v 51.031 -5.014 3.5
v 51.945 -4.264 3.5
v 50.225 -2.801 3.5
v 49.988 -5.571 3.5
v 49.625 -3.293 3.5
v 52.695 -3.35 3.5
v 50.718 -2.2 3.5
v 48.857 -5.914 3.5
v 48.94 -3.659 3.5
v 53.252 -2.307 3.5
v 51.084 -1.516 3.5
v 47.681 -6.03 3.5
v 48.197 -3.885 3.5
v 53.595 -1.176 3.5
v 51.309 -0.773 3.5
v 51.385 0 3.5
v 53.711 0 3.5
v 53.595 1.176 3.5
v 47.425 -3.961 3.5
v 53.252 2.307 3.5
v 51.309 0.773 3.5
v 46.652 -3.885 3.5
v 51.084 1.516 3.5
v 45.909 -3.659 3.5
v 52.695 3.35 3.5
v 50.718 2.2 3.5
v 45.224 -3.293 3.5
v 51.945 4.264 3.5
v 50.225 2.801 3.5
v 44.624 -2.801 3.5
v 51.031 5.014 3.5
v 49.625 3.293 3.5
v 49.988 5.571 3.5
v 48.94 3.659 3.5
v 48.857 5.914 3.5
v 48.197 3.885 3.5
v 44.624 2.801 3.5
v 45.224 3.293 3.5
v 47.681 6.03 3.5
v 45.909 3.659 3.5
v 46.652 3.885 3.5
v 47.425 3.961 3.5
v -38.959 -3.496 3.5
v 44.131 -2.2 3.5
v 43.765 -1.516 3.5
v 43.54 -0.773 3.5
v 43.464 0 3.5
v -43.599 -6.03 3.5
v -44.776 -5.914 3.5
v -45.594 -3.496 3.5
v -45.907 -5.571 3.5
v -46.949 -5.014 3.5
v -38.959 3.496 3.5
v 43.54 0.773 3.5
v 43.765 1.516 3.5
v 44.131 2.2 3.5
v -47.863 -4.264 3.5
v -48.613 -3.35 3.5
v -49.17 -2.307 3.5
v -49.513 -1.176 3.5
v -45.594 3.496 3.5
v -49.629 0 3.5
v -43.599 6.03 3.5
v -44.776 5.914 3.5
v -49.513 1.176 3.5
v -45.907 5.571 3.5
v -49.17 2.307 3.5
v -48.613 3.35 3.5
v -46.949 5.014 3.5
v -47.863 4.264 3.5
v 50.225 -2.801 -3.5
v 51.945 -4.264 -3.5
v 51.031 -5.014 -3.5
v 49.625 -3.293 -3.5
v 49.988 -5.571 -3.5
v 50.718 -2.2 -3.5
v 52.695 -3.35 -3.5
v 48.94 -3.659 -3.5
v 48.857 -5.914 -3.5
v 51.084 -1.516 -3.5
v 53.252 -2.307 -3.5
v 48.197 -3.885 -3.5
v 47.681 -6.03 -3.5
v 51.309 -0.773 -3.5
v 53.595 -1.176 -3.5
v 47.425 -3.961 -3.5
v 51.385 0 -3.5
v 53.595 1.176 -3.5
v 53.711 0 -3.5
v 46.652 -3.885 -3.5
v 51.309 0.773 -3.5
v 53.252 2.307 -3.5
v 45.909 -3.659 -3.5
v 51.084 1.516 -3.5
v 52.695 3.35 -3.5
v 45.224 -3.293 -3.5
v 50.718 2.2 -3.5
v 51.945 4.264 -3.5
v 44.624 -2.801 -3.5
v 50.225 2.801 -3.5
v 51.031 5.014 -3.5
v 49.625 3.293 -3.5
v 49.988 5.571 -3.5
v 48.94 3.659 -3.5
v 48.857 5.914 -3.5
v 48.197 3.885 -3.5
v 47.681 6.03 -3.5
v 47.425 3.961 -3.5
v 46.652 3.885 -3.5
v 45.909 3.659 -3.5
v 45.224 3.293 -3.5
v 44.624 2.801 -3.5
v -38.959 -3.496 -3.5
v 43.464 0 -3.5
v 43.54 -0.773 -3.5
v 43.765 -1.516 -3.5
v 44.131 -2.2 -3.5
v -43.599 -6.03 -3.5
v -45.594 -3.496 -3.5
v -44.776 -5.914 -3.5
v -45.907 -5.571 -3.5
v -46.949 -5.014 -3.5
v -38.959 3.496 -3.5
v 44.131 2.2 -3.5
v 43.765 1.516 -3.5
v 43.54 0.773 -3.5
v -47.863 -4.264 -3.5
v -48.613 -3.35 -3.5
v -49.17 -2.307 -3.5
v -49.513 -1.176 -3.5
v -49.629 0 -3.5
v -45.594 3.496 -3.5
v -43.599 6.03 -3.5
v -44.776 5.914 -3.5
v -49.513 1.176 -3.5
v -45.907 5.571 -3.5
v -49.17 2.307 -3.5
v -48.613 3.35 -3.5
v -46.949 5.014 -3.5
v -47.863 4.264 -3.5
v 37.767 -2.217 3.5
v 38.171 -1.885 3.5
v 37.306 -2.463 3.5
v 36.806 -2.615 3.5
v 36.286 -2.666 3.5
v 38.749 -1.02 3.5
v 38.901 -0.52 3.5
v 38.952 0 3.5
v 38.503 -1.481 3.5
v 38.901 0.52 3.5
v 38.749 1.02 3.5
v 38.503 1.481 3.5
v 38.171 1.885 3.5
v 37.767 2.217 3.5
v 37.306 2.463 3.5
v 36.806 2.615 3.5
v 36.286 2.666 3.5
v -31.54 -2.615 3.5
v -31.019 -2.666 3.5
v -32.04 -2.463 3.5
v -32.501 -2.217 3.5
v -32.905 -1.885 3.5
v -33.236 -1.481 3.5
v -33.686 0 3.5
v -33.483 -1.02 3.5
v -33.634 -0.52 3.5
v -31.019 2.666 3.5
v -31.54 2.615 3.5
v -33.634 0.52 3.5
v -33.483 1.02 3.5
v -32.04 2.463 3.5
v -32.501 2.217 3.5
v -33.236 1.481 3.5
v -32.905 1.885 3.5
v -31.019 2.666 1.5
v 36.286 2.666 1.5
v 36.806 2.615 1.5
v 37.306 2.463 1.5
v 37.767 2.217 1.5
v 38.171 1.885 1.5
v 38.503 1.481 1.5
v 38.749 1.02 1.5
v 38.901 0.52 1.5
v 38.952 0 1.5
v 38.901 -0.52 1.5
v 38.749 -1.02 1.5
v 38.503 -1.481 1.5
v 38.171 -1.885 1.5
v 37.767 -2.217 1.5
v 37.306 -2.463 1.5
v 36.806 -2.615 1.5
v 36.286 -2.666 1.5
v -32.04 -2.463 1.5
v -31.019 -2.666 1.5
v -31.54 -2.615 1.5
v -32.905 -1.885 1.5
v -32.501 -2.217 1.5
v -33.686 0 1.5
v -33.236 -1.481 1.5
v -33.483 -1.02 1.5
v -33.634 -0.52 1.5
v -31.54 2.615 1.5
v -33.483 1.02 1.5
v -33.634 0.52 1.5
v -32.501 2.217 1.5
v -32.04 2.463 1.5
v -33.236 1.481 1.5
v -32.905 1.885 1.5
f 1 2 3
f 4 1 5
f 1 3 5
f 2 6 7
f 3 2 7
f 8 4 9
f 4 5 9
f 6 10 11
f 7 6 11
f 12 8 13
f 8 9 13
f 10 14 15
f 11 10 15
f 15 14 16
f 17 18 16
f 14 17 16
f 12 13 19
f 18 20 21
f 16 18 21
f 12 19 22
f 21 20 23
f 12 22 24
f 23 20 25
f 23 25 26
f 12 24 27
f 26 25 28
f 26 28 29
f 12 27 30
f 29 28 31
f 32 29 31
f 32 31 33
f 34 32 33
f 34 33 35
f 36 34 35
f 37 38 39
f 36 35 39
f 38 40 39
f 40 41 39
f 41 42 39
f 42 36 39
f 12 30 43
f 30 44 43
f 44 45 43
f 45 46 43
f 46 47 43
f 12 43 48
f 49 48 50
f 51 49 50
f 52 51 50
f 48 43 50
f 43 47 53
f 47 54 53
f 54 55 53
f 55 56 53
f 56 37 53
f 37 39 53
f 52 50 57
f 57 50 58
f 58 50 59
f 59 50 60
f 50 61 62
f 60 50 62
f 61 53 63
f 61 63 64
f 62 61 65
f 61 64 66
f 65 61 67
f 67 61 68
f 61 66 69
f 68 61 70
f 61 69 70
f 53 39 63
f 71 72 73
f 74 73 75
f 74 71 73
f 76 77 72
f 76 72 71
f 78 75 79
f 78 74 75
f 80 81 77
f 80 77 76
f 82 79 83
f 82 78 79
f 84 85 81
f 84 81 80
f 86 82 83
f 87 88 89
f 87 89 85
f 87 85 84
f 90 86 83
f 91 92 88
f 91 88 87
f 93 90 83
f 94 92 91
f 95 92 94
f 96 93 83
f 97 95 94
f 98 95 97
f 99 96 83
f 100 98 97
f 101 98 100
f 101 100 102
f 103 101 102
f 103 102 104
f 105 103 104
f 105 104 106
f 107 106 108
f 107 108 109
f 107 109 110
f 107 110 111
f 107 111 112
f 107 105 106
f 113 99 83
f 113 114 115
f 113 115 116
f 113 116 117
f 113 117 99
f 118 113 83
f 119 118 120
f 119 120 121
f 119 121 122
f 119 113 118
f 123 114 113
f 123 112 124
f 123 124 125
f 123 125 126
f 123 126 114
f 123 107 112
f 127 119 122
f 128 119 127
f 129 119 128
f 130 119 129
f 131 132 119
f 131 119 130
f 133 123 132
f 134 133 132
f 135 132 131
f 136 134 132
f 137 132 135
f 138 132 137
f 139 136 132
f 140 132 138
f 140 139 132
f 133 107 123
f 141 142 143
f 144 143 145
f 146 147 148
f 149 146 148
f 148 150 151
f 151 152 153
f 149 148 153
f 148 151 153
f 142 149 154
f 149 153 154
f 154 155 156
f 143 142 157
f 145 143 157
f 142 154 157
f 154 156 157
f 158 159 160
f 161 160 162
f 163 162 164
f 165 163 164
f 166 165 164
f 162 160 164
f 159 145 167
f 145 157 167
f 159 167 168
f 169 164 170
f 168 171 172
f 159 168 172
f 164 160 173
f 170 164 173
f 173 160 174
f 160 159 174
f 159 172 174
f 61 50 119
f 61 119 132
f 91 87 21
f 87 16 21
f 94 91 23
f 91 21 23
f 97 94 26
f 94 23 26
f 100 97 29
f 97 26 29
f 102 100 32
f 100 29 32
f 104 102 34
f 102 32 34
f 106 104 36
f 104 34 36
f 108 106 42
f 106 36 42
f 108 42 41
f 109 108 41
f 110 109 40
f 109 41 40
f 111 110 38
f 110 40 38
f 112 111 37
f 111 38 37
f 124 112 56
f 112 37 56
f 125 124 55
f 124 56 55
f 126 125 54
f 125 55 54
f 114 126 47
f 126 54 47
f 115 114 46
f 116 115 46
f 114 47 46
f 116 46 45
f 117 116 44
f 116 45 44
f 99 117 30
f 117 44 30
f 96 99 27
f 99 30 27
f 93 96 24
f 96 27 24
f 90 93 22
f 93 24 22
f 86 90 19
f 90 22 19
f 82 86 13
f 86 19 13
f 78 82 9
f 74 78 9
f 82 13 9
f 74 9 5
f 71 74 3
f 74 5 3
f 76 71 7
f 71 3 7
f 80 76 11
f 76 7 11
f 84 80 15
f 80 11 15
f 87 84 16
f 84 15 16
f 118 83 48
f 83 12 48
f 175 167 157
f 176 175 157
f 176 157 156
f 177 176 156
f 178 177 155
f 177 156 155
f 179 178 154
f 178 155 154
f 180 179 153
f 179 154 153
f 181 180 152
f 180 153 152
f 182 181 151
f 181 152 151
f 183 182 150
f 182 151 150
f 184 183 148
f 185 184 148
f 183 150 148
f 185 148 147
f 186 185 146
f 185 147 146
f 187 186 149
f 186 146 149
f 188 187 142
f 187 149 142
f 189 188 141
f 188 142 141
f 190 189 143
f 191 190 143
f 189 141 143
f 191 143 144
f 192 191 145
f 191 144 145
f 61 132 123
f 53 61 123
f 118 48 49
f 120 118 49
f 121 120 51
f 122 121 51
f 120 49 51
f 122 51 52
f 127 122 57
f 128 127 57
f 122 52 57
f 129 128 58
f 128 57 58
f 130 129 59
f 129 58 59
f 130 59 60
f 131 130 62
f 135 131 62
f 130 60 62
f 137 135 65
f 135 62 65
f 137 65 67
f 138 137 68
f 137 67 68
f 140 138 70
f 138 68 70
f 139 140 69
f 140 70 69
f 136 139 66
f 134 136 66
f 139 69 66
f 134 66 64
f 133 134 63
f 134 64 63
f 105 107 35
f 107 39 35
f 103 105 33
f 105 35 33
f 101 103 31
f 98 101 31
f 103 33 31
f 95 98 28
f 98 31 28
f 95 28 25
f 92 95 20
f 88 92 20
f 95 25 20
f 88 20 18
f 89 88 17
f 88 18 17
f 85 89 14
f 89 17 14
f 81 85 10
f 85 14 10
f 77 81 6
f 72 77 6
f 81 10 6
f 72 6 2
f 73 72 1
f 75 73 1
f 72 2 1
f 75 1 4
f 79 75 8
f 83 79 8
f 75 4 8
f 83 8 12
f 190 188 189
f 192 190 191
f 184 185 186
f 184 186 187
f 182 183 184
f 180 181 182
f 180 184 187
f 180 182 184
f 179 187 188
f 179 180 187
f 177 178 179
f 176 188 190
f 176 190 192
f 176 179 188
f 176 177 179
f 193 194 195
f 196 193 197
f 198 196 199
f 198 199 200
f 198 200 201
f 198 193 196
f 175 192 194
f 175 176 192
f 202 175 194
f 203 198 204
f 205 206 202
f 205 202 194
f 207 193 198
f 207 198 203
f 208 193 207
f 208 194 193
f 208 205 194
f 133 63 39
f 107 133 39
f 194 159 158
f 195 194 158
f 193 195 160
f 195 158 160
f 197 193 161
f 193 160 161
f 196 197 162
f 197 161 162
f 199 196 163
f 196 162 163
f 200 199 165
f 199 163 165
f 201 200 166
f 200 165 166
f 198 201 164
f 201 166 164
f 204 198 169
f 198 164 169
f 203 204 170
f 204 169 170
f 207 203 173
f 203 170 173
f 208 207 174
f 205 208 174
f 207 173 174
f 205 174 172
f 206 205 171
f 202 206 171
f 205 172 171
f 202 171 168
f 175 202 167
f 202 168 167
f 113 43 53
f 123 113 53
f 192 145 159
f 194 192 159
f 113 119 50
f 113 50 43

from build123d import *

# Parameters (mm, degrees)
BOSS_EXTRUDE1_DEPTH     = 3.5
SKETCH3_R               = 3.960739879
CUT_EXTRUDE2_DEPTH      = 4.5
CUT_EXTRUDE2_DEPTH_BACK = 4.5
SKETCH4_W               = 6.635737024
SKETCH4_H               = 6.991222936
CUT_EXTRUDE3_DEPTH      = 4.5
CUT_EXTRUDE3_DEPTH_BACK = 4.5
BOSS_EXTRUDE5_START     = 3.5
BOSS_EXTRUDE5_DEPTH     = 2


with BuildPart() as part:
    # Sketch1 → Boss-Extrude1 (new body, symmetric)
    with BuildSketch(Plane.XY):
        with BuildLine():
            Line((-43.599357872, 6.029698429), (47.680999885, 6.029698429))
            ThreePointArc((47.680999885, 6.029698429), (53.710698314, 0), (47.680999885, -6.029698429))
            Line((47.680999885, -6.029698429), (-43.599357872, -6.029698429))
            ThreePointArc((-43.599357872, -6.029698429), (-49.629056301, 0), (-43.599357872, 6.029698429))
        make_face()
    extrude(amount=BOSS_EXTRUDE1_DEPTH, both=True)

    # Sketch3 → Cut-Extrude2 (cut, two sides)
    with BuildSketch(Plane.XY) as cut_extrude2_sk:
        with Locations((47.424522437, 0)):
            Circle(SKETCH3_R)
    extrude(amount=CUT_EXTRUDE2_DEPTH, mode=Mode.SUBTRACT)
    extrude(cut_extrude2_sk.sketch, amount=-CUT_EXTRUDE2_DEPTH_BACK, mode=Mode.SUBTRACT)

    # Sketch4 → Cut-Extrude3 (cut, two sides)
    with BuildSketch(Plane.XY) as cut_extrude3_sk:
        with Locations((-42.276422688, 0)):
            Rectangle(SKETCH4_W, SKETCH4_H)
    extrude(amount=CUT_EXTRUDE3_DEPTH, mode=Mode.SUBTRACT)
    extrude(cut_extrude3_sk.sketch, amount=-CUT_EXTRUDE3_DEPTH_BACK, mode=Mode.SUBTRACT)


with BuildPart() as body_2:
    # Sketch5 → Boss-Extrude5 (new body)
    with BuildSketch(Plane.XY.offset(BOSS_EXTRUDE5_START)):
        with BuildLine():
            Line((-31.019368808, 2.66614434), (36.285963862, 2.66614434))
            ThreePointArc((36.285963862, 2.66614434), (38.952108202, 0), (36.285963862, -2.66614434))
            Line((36.285963862, -2.66614434), (-31.019368808, -2.66614434))
            ThreePointArc((-31.019368808, -2.66614434), (-33.685513148, 0), (-31.019368808, 2.66614434))
        make_face()
    extrude(amount=-BOSS_EXTRUDE5_DEPTH)


solid = Compound([part.part, body_2.part])
